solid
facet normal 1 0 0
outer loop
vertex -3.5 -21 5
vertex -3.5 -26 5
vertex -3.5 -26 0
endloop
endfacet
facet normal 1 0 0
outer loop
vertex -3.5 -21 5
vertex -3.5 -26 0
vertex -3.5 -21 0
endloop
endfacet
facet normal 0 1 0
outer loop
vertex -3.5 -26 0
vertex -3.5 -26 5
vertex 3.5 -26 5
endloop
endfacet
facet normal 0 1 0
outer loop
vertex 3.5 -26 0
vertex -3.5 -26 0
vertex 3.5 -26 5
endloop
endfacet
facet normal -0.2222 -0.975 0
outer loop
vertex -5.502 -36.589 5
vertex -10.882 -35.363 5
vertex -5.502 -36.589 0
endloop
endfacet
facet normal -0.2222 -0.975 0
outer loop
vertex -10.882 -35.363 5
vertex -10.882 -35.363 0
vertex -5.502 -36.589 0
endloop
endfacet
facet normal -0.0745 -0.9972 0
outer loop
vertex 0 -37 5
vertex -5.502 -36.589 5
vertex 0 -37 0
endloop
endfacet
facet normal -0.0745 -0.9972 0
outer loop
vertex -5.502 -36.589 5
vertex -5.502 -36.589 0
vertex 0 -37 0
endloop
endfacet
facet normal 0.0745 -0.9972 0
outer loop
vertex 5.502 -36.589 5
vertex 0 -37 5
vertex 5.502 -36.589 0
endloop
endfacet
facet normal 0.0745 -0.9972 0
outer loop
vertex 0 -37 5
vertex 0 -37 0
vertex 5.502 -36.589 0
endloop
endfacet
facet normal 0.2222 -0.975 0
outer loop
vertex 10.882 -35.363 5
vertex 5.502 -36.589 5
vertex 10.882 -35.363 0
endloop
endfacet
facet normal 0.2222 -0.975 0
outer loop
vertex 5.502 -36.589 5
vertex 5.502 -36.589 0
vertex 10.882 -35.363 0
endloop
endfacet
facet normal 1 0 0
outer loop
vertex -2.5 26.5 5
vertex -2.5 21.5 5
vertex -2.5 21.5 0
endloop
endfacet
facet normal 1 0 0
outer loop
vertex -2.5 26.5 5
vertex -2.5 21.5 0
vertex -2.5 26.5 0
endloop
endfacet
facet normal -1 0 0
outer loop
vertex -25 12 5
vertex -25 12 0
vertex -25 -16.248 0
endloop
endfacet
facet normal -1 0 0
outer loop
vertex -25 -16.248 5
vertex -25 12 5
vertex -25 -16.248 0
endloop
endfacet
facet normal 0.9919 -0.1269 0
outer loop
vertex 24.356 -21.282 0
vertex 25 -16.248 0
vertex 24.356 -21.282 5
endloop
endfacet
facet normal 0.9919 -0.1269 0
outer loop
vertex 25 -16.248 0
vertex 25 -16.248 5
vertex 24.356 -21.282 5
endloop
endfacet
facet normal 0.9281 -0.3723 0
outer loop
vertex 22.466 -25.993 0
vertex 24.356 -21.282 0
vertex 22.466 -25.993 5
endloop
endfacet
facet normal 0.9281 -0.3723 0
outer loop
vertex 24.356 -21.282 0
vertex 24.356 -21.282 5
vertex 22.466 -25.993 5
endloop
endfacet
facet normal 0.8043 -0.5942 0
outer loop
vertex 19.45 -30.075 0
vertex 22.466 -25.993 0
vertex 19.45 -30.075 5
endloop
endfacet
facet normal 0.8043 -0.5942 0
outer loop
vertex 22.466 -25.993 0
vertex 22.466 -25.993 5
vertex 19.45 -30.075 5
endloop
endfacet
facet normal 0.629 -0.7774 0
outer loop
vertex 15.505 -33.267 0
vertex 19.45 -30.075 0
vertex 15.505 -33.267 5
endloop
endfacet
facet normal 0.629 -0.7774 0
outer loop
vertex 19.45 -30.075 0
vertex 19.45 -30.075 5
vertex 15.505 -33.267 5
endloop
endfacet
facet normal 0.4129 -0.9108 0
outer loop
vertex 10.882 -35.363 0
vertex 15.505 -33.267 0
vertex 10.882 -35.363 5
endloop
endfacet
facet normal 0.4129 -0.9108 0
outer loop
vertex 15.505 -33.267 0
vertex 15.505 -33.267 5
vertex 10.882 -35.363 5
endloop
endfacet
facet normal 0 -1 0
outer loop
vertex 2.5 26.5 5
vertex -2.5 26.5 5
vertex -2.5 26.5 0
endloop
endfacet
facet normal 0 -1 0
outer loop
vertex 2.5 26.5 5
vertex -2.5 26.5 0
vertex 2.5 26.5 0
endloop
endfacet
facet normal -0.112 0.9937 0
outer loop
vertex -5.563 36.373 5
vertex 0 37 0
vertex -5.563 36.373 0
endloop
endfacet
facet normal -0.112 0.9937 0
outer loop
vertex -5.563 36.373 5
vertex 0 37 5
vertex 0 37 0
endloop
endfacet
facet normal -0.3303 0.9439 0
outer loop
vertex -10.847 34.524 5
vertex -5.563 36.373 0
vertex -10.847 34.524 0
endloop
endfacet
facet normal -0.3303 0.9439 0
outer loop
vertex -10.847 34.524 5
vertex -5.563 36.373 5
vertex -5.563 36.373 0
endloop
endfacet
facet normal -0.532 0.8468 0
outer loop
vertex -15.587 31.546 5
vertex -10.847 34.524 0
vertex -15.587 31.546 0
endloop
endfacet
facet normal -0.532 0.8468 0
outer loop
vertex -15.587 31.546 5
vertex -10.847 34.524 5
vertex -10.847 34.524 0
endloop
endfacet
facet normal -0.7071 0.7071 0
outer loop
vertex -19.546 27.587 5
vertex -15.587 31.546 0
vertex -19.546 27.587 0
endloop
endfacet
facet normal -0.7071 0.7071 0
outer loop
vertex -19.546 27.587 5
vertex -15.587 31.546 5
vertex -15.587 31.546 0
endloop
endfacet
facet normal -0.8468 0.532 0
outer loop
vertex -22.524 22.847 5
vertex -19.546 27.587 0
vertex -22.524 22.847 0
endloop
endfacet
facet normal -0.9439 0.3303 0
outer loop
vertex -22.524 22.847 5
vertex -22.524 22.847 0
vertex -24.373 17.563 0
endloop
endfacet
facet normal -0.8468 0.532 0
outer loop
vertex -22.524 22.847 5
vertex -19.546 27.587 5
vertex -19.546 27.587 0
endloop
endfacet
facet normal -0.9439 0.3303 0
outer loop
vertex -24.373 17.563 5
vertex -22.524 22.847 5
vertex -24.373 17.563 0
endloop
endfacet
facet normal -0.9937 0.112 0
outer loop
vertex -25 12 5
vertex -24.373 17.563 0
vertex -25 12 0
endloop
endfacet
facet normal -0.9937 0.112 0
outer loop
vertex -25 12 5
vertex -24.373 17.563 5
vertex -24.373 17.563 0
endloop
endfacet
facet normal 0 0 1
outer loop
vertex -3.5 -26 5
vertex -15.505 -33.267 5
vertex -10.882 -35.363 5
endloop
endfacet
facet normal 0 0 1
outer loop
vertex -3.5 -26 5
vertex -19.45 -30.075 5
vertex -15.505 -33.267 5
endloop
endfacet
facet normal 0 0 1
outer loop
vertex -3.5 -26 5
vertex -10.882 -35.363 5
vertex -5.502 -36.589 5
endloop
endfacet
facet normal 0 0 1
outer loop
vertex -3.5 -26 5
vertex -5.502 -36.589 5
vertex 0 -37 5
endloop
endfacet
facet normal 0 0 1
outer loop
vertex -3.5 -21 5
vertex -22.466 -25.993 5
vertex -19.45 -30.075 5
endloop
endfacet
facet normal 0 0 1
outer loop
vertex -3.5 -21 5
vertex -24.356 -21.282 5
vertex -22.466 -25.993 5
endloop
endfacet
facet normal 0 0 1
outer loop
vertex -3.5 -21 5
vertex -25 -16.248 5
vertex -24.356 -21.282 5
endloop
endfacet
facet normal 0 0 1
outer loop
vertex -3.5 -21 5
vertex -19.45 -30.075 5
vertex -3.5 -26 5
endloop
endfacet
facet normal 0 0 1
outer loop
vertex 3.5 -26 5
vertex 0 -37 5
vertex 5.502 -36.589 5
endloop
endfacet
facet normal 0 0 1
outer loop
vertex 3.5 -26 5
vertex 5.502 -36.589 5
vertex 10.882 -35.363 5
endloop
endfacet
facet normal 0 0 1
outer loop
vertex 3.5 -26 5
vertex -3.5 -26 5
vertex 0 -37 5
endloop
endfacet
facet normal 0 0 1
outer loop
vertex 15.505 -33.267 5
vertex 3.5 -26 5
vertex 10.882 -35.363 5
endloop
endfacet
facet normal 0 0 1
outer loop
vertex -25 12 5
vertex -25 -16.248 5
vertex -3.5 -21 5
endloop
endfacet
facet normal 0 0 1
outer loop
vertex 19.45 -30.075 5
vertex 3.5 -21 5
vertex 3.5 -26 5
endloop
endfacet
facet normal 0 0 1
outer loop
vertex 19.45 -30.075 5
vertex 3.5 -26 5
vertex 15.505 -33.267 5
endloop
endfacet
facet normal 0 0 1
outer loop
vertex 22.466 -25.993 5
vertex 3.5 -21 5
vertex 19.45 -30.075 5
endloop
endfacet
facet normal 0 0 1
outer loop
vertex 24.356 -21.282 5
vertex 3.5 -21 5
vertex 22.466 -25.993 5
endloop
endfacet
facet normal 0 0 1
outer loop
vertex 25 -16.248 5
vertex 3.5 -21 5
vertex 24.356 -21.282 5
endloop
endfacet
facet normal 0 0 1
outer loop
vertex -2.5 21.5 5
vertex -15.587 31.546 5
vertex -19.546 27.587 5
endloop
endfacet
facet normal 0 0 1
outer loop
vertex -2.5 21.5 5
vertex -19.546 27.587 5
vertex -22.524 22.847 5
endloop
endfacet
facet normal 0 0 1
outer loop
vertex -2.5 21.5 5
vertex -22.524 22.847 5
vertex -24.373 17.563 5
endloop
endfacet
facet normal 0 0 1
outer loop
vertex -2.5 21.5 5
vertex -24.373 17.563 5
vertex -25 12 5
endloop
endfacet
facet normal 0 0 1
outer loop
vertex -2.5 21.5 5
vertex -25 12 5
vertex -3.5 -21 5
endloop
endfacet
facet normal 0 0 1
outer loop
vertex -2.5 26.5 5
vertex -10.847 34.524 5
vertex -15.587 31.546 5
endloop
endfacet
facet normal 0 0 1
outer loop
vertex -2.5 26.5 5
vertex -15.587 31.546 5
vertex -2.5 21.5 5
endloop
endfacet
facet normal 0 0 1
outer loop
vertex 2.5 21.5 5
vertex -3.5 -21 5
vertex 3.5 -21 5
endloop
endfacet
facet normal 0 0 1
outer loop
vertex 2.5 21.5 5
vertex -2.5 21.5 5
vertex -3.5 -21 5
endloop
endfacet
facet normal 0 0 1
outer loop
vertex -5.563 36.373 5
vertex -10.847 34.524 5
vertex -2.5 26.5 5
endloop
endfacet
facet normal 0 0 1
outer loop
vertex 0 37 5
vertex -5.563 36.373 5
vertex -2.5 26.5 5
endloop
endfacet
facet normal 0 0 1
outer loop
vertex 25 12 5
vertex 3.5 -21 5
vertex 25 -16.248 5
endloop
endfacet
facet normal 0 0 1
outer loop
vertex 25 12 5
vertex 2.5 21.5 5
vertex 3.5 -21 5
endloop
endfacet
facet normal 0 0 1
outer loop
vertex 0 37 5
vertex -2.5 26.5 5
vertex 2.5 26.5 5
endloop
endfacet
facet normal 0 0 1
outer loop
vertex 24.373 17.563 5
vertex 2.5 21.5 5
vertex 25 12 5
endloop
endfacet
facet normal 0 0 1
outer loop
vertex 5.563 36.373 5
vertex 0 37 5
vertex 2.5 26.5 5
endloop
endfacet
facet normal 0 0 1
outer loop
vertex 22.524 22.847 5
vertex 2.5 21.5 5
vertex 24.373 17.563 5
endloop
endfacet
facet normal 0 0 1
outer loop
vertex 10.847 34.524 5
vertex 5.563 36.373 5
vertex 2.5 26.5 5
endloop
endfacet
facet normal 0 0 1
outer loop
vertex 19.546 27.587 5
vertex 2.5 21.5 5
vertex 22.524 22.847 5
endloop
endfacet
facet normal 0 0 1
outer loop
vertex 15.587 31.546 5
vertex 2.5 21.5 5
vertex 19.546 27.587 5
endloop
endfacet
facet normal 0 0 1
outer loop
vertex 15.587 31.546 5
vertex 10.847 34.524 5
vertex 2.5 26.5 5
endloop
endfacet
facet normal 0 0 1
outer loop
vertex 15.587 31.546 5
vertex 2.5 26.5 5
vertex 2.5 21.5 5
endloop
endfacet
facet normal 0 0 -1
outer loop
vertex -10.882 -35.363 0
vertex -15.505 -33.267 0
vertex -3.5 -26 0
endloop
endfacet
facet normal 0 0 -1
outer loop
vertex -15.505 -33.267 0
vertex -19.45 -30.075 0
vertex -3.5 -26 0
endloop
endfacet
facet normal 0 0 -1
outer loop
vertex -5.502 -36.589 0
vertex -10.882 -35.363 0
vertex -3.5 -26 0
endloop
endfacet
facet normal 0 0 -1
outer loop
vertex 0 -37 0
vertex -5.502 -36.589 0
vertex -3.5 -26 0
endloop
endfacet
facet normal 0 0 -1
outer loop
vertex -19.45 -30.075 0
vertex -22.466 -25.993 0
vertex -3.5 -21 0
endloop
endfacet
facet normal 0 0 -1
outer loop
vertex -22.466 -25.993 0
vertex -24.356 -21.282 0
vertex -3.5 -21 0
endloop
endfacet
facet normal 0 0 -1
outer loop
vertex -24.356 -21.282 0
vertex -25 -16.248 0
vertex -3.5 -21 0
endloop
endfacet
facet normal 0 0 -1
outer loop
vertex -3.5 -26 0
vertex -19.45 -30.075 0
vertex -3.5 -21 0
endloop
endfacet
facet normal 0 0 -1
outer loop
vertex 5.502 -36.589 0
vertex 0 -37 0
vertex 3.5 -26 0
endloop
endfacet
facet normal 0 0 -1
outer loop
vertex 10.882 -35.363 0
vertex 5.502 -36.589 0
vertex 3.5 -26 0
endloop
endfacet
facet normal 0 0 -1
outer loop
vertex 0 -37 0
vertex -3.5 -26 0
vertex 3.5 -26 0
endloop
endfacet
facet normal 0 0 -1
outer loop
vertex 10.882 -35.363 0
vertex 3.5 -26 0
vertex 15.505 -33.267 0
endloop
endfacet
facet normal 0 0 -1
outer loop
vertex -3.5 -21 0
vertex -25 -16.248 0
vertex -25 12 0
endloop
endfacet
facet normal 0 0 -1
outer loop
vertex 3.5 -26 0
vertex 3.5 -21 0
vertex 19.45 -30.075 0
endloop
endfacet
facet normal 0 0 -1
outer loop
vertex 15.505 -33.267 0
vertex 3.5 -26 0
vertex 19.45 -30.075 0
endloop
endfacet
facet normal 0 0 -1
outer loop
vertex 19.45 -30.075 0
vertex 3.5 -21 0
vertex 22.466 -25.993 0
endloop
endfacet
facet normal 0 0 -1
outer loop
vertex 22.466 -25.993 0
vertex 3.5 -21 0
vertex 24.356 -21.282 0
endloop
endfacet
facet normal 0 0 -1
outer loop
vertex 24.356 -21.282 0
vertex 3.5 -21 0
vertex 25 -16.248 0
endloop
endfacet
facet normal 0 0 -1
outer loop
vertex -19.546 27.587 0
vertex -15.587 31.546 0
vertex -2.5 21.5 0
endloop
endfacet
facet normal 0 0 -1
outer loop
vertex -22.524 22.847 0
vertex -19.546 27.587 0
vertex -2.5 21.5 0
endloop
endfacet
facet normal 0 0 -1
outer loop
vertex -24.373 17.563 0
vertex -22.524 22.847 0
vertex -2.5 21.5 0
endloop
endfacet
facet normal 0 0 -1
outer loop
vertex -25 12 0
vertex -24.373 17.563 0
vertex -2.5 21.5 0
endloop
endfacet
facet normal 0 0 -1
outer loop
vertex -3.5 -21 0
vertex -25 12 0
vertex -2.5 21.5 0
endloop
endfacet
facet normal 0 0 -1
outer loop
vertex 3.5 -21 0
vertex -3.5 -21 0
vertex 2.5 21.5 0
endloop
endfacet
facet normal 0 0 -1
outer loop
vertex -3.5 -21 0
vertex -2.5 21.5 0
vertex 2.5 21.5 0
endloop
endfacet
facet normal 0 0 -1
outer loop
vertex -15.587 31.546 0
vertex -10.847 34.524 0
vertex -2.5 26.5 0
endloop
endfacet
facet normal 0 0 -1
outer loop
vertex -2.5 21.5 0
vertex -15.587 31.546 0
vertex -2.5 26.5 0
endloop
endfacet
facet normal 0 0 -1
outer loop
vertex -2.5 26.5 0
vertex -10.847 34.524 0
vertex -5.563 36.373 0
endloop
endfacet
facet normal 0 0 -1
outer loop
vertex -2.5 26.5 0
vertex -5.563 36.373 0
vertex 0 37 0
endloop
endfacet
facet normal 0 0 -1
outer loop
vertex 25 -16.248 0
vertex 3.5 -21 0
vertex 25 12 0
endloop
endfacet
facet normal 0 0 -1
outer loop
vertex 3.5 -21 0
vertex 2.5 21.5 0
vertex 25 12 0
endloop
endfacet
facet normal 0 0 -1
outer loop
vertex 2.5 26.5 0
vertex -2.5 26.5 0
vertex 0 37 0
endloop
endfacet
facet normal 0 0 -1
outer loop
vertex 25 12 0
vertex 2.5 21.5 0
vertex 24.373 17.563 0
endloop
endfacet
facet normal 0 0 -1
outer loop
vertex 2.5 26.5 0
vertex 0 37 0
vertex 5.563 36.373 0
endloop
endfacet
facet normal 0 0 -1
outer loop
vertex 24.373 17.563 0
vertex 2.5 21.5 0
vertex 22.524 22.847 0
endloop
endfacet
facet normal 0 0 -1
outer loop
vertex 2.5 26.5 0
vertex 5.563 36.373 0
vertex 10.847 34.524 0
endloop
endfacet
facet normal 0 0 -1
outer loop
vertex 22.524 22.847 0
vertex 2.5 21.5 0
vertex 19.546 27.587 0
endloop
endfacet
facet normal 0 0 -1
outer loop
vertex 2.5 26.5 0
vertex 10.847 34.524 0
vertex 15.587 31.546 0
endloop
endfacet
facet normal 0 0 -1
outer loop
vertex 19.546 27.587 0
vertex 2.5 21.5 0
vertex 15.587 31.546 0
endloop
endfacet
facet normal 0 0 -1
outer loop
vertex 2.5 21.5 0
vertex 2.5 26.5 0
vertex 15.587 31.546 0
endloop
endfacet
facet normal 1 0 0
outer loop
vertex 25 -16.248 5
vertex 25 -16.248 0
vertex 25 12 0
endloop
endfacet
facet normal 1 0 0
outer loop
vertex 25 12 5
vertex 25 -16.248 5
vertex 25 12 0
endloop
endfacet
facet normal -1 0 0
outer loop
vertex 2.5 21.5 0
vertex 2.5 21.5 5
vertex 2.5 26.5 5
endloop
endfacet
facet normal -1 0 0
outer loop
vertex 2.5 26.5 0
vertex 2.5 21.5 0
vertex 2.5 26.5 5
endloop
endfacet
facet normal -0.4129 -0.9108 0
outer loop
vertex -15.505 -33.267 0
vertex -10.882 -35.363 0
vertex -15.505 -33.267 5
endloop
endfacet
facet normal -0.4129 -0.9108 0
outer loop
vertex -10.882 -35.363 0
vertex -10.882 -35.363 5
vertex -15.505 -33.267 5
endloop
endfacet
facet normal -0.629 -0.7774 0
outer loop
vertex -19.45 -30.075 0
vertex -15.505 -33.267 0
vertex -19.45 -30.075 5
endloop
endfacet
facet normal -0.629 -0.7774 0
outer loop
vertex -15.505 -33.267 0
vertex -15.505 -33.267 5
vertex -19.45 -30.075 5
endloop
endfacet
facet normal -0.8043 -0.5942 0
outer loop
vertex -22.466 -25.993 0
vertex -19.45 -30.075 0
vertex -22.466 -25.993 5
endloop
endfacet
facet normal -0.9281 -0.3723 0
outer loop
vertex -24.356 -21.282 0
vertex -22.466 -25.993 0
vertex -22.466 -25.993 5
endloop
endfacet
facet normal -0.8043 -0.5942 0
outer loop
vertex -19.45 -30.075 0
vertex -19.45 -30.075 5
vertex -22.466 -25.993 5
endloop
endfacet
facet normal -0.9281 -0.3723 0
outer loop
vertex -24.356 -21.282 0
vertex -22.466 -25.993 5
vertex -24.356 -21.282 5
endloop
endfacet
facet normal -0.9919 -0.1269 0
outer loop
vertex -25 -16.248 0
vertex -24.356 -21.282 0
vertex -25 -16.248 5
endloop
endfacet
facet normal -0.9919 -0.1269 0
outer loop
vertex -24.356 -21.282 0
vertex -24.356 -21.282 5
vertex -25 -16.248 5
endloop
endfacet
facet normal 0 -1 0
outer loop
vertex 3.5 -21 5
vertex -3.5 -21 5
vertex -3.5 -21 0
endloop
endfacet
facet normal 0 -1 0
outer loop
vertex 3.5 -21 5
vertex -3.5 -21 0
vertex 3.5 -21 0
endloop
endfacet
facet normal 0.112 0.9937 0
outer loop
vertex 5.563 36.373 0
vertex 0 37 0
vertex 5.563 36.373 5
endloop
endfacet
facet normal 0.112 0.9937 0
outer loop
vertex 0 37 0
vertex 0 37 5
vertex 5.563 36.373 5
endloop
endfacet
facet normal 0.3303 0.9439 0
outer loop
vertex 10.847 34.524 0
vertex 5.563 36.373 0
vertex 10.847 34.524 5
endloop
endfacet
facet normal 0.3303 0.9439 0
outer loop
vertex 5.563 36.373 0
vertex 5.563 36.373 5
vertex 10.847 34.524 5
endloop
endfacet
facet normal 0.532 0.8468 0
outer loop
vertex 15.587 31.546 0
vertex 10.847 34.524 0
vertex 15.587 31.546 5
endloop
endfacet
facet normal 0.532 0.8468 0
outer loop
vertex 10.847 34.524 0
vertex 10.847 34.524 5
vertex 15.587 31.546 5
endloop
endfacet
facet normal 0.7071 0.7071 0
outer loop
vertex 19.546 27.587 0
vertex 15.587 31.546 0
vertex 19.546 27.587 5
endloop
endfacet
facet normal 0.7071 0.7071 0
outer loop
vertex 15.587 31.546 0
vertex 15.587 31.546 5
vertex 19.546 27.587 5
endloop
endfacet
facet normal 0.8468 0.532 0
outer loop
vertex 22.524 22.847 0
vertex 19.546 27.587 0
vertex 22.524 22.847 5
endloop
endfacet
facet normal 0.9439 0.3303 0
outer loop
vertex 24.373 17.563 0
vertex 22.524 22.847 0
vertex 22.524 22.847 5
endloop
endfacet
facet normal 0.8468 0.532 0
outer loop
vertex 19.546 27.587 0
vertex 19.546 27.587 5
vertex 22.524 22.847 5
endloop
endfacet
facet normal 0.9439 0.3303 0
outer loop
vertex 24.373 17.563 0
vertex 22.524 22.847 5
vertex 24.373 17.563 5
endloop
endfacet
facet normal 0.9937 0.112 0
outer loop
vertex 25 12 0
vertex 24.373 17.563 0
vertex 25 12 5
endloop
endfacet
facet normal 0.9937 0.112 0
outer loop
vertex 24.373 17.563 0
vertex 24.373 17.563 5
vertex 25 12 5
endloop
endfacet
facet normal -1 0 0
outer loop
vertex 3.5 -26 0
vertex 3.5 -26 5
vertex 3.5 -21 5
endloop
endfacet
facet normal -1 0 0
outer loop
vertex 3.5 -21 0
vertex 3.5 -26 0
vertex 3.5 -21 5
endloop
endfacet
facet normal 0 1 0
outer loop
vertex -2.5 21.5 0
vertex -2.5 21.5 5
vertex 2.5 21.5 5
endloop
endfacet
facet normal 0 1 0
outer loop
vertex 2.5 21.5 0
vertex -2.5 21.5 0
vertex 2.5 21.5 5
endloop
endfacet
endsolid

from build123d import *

# Parameters (mm, degrees)
SKETCH1_R           = 37
BOSS_EXTRUDE1_DEPTH = 5
CUT_EXTRUDE3_START  = -10
CUT_EXTRUDE3_DEPTH  = 10
FILLET2_R           = 25
FILLET3_R           = 20
SKETCH7_W           = 5
SKETCH7_H           = 5
SKETCH7_W_2         = 7
CUT_EXTRUDE4_DEPTH  = 10


with BuildPart() as part:
    # Sketch1 → Boss-Extrude1 (new body)
    with BuildSketch(Plane.XY):
        Circle(SKETCH1_R)
    extrude(amount=BOSS_EXTRUDE1_DEPTH)

    # Sketch6 → Cut-Extrude3 (cut)
    with BuildSketch(Plane.XY.offset(5).offset(CUT_EXTRUDE3_START)):
        with BuildLine():
            Line((-25, 27.276363394), (-25, -27.276363394))
            ThreePointArc((-25, -27.276363394), (-37, 0), (-25, 27.276363394))
        make_face()
        with BuildLine():
            Line((25, -27.276363394), (25, 27.276363394))
            ThreePointArc((25, 27.276363394), (37, 0), (25, -27.276363394))
        make_face()
    extrude(amount=CUT_EXTRUDE3_DEPTH, mode=Mode.SUBTRACT)

    # Fillet2
    fillet2_edges = [part.edges().sort_by_distance(p)[0] for p in [
        (-25, 27.276363394, 2.5),
        (25, 27.276363394, 2.5),
    ]]
    fillet(fillet2_edges, radius=FILLET2_R - 0.0001)  # a hair under: the kernel refuses the full size

    # Fillet3
    fillet3_edges = [part.edges().sort_by_distance(p)[0] for p in [
        (-25, -27.276363394, 2.5),
        (25, -27.276363394, 2.5),
    ]]
    fillet(fillet3_edges, radius=FILLET3_R)

    # Sketch7 → Cut-Extrude4 (cut)
    with BuildSketch(Plane.XY.offset(5)):
        with Locations((0, 24)):
            Rectangle(SKETCH7_W, SKETCH7_H)
        with Locations((0, -23.5)):
            Rectangle(SKETCH7_W_2, SKETCH7_H)
    extrude(amount=-CUT_EXTRUDE4_DEPTH, mode=Mode.SUBTRACT)


solid = part.part
